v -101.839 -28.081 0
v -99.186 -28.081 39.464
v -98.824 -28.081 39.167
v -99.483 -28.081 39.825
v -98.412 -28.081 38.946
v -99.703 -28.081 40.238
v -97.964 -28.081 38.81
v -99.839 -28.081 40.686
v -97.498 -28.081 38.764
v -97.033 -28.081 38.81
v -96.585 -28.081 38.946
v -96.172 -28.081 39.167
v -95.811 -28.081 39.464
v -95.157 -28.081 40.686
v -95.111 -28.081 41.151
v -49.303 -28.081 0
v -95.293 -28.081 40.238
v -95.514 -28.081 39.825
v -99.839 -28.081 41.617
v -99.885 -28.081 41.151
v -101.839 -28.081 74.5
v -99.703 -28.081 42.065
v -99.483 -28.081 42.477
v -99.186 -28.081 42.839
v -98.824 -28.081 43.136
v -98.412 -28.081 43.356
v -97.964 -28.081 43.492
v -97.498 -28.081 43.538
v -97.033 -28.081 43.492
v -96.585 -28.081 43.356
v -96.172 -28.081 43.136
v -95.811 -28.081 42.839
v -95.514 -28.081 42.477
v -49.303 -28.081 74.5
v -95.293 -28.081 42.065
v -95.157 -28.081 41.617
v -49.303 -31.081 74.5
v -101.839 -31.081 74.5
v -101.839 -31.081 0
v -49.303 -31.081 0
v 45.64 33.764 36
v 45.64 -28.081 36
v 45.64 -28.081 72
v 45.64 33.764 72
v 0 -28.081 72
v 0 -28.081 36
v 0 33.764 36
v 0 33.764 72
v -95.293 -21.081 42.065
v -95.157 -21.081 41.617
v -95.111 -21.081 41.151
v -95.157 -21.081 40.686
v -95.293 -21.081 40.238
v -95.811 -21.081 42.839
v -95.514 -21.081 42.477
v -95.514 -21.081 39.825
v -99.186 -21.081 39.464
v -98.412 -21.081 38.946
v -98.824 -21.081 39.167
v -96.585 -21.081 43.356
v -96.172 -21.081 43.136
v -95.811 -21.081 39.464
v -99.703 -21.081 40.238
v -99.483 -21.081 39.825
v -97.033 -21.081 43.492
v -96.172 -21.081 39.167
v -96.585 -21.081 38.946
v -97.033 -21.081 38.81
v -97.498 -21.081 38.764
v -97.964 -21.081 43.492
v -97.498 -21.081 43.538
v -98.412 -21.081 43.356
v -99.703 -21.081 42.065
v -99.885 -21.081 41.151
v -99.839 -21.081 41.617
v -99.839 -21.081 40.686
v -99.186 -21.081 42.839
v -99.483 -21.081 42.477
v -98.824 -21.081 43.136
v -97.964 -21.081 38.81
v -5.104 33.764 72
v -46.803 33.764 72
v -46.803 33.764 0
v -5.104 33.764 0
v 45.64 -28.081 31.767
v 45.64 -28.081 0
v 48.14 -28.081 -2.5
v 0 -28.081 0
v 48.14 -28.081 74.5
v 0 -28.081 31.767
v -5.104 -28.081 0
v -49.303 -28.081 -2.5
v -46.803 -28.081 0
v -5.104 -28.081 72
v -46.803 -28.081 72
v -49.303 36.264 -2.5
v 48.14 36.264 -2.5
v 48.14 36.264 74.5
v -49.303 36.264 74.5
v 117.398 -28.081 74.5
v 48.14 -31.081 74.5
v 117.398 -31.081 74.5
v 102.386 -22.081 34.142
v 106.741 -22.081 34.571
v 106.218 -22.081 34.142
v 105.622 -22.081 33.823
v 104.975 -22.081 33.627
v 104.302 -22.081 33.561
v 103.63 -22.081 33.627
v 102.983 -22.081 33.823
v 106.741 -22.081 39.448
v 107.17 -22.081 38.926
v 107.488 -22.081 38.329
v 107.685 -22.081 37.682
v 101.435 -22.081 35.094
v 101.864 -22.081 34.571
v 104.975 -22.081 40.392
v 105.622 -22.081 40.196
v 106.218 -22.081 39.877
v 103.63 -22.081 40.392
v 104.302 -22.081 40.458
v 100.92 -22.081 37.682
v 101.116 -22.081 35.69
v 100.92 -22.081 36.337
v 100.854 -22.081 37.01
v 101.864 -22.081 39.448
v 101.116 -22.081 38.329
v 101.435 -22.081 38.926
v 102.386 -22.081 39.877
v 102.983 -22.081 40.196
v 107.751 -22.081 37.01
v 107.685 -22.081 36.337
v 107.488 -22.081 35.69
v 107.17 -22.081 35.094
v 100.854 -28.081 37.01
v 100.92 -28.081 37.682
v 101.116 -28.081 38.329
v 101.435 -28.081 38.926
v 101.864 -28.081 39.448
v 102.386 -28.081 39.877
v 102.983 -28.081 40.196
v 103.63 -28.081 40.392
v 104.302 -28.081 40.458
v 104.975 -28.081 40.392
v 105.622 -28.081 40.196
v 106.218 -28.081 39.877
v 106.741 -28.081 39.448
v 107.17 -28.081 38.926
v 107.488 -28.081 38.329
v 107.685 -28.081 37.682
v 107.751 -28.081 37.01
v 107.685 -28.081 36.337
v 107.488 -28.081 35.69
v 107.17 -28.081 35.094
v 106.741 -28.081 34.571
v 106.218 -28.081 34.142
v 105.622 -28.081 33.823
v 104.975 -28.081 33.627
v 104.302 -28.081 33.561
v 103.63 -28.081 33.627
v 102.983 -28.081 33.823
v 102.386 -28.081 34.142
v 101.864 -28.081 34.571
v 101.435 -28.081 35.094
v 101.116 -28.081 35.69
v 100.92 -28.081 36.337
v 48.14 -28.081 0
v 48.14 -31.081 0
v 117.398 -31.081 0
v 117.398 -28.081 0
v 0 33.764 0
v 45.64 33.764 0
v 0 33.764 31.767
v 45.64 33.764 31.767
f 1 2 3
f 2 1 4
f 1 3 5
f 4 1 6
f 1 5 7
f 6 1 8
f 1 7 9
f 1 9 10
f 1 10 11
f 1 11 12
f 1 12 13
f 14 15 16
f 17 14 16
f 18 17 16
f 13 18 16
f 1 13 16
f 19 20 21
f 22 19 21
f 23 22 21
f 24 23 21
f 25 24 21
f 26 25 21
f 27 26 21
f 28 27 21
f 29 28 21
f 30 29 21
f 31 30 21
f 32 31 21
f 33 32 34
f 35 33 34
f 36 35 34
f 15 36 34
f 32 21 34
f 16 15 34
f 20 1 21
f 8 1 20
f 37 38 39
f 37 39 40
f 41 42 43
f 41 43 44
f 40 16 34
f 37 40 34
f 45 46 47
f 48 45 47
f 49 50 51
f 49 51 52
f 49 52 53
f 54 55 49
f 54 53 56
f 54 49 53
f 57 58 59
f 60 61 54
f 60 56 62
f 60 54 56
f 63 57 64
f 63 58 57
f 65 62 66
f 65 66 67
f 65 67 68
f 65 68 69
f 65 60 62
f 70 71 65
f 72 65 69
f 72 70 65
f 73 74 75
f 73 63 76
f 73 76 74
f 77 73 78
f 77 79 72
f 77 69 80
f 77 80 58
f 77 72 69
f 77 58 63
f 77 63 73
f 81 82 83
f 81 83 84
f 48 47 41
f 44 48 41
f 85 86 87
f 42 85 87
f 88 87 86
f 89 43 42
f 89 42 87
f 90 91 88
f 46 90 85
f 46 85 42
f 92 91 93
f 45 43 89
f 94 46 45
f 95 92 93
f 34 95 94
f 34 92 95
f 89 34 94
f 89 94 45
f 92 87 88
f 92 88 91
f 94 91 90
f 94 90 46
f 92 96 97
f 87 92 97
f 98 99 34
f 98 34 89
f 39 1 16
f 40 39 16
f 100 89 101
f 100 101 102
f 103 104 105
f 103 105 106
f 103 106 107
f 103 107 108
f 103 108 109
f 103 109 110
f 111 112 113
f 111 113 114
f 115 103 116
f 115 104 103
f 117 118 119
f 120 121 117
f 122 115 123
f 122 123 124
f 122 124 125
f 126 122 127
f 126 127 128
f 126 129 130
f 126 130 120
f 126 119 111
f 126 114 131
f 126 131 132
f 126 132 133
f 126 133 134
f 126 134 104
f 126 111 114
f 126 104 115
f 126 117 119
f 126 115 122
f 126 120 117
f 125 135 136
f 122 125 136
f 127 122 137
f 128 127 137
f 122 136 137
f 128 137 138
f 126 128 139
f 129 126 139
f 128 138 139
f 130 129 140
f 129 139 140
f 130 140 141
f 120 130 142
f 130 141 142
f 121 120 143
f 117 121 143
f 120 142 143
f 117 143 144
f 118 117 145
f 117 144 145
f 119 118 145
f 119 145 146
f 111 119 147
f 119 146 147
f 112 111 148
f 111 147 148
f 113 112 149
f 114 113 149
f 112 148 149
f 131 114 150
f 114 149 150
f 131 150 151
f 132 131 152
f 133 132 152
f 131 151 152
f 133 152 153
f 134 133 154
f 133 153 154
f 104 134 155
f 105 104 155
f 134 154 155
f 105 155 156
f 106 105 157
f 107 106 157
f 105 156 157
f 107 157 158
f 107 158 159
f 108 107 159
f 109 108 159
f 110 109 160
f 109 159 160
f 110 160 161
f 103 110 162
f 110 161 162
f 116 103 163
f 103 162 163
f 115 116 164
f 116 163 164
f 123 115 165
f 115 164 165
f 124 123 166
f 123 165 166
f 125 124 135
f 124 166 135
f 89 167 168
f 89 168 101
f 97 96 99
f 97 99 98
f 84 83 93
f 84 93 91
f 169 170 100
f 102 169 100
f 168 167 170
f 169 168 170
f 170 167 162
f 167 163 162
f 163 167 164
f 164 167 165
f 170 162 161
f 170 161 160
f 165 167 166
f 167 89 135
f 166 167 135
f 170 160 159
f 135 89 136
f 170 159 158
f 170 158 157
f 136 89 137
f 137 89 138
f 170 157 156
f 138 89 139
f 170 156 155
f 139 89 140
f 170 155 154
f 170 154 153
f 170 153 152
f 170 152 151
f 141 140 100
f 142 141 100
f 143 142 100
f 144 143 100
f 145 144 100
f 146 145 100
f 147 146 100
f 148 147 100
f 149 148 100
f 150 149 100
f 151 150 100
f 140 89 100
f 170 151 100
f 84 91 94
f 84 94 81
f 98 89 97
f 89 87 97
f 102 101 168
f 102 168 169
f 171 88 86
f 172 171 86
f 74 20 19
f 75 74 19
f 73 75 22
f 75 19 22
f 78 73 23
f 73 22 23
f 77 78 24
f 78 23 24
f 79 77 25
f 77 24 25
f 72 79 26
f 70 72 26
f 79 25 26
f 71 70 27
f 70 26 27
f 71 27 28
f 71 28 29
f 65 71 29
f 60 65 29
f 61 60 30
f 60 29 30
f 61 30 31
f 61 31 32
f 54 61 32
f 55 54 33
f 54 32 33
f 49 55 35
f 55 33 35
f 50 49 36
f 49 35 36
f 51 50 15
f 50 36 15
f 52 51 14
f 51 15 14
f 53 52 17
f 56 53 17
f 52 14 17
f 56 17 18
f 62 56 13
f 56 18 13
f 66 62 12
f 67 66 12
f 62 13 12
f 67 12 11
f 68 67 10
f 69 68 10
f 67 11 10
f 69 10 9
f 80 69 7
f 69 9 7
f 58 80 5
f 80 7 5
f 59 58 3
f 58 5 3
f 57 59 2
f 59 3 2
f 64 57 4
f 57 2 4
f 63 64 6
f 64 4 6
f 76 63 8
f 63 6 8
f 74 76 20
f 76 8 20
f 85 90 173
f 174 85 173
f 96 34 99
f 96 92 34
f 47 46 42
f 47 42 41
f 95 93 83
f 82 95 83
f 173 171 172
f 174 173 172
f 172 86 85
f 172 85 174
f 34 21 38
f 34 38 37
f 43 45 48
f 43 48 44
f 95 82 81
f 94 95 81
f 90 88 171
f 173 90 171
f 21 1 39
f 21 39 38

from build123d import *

# Parameters (mm, degrees)
F0_W      = 92.4431048334
F0_H      = 61.8447158486
F1_DEPTH  = 72
F2_T      = 2.5
F3_W      = 5.1042162813
F3_H      = 61.8447158486
F4_DEPTH  = 72
F5_W      = 61.8447158486
F5_H      = 4.2327993214
F6_DEPTH  = 47
F7_W      = 52.5356544554
F7_H      = 74.5
F8_DEPTH  = 3
F9_R      = 2.3868523894
F10_DEPTH = 7
F11_W     = 69.2574879527
F11_H     = 74.5
F12_DEPTH = 3
F13_R     = 3.4486814064
F14_DEPTH = 6


with BuildPart() as f1:
    # F0 (on Top) → F1 (new body)
    with BuildSketch(Plane.XY):
        with Locations((-0.5814712495, 2.8415350243)):
            Rectangle(F0_W, F0_H)
    extrude(amount=F1_DEPTH)

    # F2
    f2_openings = [f1.faces().sort_by_distance(p)[0] for p in [
        (-0.581471, -28.080823, 36),
    ]]
    offset(amount=F2_T, openings=f2_openings, kind=Kind.INTERSECTION)

    # F3 (on face) → F4 (join)
    with BuildSketch(Plane.XY):
        with Locations((-2.5521081407, 2.8415350243)):
            Rectangle(F3_W, F3_H)
    extrude(amount=F4_DEPTH)

    # F5 (on face) → F6 (join)
    with BuildSketch(Plane.YZ):
        with Locations((2.8415350243, 33.8836003393)):
            Rectangle(F5_W, F5_H)
    extrude(amount=F6_DEPTH)


with BuildPart() as f8:
    # F7 (on face) → F8 (new body)
    with BuildSketch(Plane.XZ.offset(28.0808228999)):
        with Locations((-75.5708508939, 37.25)):
            Rectangle(F7_W, F7_H)
    extrude(amount=F8_DEPTH)

    # F9 (on face) → F10 (join)
    with BuildSketch(Plane(origin=(0, -28.0808228999, 0), x_dir=(-1, 0, 0), z_dir=(0, 1, 0))):
        with Locations((97.4982827902, 41.1513149738)):
            Circle(F9_R)
    extrude(amount=F10_DEPTH)


with BuildPart() as f12:
    # F11 (on face) → F12 (new body)
    with BuildSketch(Plane.XZ.offset(28.0808228999)):
        with Locations((82.7688251436, 37.25)):
            Rectangle(F11_W, F11_H)
    extrude(amount=F12_DEPTH)

    # F13 (on face) → F14 (join)
    with BuildSketch(Plane(origin=(0, -28.0808228999, 0), x_dir=(-1, 0, 0), z_dir=(0, 1, 0))):
        with Locations((-104.3023094535, 37.0095334947)):
            Circle(F13_R)
    extrude(amount=F14_DEPTH)


solid = Compound([f1.part, f8.part, f12.part])
